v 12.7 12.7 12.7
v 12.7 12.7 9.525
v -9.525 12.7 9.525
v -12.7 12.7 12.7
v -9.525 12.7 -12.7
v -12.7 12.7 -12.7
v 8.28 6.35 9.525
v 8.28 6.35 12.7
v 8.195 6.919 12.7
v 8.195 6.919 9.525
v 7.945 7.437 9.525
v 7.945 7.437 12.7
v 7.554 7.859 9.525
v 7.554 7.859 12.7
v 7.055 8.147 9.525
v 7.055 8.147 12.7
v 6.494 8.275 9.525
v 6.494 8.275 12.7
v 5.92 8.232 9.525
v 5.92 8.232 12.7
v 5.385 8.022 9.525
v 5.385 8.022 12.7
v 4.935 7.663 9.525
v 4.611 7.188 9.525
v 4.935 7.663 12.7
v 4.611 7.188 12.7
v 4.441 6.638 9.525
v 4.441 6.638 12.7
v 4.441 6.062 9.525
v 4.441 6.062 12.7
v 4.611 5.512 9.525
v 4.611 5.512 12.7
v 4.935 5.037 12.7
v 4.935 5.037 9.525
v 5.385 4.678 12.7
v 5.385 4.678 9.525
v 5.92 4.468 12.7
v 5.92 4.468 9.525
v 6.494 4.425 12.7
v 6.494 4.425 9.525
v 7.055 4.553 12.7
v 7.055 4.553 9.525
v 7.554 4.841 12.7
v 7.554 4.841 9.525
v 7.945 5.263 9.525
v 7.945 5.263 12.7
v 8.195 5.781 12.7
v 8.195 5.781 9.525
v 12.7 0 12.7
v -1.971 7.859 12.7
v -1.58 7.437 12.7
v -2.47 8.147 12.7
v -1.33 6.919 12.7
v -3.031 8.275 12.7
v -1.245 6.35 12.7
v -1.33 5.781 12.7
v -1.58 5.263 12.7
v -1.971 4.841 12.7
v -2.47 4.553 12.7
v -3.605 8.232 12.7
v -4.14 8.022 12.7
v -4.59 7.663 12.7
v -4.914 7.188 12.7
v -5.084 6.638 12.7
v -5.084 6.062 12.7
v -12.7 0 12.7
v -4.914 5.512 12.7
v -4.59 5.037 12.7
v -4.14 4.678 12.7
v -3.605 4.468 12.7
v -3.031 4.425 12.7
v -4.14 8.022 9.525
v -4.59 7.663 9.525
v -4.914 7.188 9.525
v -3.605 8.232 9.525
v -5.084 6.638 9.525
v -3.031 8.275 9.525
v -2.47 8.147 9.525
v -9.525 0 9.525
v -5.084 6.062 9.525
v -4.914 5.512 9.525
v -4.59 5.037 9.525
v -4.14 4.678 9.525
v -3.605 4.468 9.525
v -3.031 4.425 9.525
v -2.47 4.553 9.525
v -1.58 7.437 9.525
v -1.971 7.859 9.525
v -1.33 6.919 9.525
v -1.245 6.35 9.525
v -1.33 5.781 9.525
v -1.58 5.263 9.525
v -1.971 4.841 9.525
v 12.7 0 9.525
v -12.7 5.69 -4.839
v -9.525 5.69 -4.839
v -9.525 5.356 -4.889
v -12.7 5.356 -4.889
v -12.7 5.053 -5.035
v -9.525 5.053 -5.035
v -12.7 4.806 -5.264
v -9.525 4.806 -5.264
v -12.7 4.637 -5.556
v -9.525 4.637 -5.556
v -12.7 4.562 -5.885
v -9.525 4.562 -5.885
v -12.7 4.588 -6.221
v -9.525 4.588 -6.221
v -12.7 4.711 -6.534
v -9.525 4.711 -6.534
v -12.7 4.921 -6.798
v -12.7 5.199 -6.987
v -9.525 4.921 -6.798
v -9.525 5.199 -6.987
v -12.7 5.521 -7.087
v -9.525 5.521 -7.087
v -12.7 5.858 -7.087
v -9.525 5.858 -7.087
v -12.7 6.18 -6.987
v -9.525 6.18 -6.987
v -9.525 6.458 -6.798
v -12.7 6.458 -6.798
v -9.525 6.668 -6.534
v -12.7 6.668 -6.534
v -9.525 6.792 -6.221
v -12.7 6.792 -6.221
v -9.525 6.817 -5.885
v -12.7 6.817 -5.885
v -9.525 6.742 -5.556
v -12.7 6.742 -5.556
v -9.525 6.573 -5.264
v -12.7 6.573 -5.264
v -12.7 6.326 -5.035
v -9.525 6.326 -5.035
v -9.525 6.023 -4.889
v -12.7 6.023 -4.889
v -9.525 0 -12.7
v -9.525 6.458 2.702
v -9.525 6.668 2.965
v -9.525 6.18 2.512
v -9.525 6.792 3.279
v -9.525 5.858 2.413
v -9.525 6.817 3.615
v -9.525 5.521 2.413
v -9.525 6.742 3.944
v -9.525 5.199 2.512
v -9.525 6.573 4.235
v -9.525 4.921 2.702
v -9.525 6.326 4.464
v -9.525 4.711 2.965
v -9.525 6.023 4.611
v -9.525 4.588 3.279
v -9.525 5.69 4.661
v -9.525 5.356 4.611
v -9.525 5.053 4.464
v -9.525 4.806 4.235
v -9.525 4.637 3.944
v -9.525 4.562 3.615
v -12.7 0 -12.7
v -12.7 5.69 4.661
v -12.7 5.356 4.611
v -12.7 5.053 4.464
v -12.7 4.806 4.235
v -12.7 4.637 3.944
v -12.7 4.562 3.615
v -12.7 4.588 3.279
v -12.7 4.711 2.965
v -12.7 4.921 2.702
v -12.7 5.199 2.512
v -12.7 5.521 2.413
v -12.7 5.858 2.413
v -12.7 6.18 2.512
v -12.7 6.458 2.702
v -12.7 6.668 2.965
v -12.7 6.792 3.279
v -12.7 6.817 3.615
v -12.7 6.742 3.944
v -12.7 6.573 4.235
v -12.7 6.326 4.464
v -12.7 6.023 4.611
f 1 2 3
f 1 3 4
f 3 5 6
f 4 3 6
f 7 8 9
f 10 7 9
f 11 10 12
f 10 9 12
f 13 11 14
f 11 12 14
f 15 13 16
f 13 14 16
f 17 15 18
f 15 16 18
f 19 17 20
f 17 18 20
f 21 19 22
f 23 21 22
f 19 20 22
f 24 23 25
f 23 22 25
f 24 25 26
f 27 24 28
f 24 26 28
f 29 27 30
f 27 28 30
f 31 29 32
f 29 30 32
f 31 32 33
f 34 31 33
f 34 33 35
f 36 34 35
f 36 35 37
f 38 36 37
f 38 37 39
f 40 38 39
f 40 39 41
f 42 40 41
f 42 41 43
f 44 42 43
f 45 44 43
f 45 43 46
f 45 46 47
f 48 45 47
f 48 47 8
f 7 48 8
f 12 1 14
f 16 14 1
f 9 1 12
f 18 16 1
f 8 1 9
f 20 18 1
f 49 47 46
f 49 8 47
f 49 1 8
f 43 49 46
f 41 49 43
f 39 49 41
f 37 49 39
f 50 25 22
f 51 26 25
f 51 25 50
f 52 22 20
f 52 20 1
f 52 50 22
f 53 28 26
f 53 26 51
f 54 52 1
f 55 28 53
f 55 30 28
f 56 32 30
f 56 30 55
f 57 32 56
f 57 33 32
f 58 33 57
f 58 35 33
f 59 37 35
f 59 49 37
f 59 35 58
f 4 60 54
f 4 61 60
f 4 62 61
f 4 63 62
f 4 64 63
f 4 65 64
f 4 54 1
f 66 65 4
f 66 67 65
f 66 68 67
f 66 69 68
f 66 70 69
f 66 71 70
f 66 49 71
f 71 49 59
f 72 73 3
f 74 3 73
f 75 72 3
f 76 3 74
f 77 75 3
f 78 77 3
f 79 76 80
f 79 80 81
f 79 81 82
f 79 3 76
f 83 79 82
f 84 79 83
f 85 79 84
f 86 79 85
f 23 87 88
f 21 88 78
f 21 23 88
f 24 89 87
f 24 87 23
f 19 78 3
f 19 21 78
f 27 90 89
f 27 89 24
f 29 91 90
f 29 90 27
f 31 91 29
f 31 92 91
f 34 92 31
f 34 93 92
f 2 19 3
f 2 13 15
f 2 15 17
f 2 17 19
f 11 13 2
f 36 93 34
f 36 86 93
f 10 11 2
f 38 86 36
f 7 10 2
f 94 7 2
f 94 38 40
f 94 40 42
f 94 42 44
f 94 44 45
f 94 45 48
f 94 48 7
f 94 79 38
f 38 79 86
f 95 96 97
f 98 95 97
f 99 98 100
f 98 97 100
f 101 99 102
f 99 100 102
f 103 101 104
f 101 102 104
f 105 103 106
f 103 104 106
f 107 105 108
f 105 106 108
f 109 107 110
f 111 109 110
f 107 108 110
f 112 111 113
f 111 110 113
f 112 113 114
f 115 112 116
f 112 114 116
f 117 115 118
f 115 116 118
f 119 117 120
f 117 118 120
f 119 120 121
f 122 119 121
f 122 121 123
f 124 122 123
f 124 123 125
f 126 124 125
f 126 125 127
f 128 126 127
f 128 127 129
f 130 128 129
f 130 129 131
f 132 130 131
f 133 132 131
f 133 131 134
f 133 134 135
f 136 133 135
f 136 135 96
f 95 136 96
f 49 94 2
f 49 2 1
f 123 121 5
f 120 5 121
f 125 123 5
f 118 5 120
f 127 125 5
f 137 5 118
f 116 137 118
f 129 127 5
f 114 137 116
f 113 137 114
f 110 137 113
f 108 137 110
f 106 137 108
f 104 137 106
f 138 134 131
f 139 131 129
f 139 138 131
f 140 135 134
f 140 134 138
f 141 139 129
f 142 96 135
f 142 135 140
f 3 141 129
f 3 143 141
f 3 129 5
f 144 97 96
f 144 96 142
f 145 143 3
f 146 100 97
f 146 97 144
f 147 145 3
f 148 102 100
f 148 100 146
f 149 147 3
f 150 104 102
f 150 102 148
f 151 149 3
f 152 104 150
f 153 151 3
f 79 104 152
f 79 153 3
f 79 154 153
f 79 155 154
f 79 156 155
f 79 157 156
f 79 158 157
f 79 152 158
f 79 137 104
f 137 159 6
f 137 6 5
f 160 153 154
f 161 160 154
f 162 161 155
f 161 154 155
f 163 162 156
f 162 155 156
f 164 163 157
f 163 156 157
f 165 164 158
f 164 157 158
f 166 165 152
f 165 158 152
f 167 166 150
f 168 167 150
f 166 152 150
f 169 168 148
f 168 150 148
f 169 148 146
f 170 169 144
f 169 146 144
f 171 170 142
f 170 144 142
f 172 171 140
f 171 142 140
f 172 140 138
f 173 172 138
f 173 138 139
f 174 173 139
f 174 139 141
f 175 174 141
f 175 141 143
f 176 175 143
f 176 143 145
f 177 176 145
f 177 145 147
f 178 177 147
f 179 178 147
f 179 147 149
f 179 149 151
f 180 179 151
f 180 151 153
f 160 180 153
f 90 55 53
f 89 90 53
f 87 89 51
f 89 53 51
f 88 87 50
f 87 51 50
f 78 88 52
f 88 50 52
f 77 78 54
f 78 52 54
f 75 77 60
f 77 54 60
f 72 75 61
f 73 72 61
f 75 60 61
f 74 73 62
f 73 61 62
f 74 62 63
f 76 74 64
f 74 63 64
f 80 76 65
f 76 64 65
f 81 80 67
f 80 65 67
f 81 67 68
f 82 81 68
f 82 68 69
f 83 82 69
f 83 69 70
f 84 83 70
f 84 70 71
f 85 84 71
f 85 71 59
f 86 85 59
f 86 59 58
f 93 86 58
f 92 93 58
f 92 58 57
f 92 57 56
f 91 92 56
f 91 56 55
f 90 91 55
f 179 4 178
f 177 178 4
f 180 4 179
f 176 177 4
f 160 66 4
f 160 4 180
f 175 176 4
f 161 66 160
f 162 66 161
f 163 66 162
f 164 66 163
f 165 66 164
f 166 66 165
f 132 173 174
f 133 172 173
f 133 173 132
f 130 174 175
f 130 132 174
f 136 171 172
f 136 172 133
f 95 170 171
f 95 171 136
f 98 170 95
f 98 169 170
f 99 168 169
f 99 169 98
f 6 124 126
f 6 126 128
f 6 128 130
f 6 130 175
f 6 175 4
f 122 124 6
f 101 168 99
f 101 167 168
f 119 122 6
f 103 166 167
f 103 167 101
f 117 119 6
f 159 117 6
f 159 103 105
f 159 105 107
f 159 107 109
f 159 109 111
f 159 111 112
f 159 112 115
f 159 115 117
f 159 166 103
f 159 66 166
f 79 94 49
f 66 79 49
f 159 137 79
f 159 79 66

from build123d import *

# Parameters (mm, degrees)
BOSS_EXTRUDE1_DEPTH         = 12.7
F_24_0_152_DIAMETER_HOLE1_D = 3.8608
TAP_DRILL_FOR_4_40_TAP1_D   = 2.2606


with BuildPart() as part:
    # Sketch1 → Boss-Extrude1 (new body)
    with BuildSketch(Plane(origin=(0, 0, 0), x_dir=(1, 0, 0), z_dir=(0, 1, 0))):
        Polygon((-9.525, 12.7), (-9.525, -9.525), (12.7, -9.525), (12.7, -12.7), (-12.7, -12.7), (-12.7, 12.7), align=None)
    extrude(amount=BOSS_EXTRUDE1_DEPTH)

    # #24 (0.152) Diameter Hole1 (through all)
    with Locations(Plane(origin=(6.35, 6.35, 9.525), x_dir=(-1, 0, 0), z_dir=(0, 0, -1))):
        with Locations((0, 0), (9.525, 0)):
            Hole(F_24_0_152_DIAMETER_HOLE1_D / 2)

    # Tap Drill for #4-40 Tap1 (through all)
    with Locations(Plane(origin=(-12.7, 5.6896, -5.969), x_dir=(0, 0, -1), z_dir=(-1, 0, 0))):
        with Locations((0, 0), (-9.4996, 0)):
            Hole(TAP_DRILL_FOR_4_40_TAP1_D / 2)


solid = part.part
